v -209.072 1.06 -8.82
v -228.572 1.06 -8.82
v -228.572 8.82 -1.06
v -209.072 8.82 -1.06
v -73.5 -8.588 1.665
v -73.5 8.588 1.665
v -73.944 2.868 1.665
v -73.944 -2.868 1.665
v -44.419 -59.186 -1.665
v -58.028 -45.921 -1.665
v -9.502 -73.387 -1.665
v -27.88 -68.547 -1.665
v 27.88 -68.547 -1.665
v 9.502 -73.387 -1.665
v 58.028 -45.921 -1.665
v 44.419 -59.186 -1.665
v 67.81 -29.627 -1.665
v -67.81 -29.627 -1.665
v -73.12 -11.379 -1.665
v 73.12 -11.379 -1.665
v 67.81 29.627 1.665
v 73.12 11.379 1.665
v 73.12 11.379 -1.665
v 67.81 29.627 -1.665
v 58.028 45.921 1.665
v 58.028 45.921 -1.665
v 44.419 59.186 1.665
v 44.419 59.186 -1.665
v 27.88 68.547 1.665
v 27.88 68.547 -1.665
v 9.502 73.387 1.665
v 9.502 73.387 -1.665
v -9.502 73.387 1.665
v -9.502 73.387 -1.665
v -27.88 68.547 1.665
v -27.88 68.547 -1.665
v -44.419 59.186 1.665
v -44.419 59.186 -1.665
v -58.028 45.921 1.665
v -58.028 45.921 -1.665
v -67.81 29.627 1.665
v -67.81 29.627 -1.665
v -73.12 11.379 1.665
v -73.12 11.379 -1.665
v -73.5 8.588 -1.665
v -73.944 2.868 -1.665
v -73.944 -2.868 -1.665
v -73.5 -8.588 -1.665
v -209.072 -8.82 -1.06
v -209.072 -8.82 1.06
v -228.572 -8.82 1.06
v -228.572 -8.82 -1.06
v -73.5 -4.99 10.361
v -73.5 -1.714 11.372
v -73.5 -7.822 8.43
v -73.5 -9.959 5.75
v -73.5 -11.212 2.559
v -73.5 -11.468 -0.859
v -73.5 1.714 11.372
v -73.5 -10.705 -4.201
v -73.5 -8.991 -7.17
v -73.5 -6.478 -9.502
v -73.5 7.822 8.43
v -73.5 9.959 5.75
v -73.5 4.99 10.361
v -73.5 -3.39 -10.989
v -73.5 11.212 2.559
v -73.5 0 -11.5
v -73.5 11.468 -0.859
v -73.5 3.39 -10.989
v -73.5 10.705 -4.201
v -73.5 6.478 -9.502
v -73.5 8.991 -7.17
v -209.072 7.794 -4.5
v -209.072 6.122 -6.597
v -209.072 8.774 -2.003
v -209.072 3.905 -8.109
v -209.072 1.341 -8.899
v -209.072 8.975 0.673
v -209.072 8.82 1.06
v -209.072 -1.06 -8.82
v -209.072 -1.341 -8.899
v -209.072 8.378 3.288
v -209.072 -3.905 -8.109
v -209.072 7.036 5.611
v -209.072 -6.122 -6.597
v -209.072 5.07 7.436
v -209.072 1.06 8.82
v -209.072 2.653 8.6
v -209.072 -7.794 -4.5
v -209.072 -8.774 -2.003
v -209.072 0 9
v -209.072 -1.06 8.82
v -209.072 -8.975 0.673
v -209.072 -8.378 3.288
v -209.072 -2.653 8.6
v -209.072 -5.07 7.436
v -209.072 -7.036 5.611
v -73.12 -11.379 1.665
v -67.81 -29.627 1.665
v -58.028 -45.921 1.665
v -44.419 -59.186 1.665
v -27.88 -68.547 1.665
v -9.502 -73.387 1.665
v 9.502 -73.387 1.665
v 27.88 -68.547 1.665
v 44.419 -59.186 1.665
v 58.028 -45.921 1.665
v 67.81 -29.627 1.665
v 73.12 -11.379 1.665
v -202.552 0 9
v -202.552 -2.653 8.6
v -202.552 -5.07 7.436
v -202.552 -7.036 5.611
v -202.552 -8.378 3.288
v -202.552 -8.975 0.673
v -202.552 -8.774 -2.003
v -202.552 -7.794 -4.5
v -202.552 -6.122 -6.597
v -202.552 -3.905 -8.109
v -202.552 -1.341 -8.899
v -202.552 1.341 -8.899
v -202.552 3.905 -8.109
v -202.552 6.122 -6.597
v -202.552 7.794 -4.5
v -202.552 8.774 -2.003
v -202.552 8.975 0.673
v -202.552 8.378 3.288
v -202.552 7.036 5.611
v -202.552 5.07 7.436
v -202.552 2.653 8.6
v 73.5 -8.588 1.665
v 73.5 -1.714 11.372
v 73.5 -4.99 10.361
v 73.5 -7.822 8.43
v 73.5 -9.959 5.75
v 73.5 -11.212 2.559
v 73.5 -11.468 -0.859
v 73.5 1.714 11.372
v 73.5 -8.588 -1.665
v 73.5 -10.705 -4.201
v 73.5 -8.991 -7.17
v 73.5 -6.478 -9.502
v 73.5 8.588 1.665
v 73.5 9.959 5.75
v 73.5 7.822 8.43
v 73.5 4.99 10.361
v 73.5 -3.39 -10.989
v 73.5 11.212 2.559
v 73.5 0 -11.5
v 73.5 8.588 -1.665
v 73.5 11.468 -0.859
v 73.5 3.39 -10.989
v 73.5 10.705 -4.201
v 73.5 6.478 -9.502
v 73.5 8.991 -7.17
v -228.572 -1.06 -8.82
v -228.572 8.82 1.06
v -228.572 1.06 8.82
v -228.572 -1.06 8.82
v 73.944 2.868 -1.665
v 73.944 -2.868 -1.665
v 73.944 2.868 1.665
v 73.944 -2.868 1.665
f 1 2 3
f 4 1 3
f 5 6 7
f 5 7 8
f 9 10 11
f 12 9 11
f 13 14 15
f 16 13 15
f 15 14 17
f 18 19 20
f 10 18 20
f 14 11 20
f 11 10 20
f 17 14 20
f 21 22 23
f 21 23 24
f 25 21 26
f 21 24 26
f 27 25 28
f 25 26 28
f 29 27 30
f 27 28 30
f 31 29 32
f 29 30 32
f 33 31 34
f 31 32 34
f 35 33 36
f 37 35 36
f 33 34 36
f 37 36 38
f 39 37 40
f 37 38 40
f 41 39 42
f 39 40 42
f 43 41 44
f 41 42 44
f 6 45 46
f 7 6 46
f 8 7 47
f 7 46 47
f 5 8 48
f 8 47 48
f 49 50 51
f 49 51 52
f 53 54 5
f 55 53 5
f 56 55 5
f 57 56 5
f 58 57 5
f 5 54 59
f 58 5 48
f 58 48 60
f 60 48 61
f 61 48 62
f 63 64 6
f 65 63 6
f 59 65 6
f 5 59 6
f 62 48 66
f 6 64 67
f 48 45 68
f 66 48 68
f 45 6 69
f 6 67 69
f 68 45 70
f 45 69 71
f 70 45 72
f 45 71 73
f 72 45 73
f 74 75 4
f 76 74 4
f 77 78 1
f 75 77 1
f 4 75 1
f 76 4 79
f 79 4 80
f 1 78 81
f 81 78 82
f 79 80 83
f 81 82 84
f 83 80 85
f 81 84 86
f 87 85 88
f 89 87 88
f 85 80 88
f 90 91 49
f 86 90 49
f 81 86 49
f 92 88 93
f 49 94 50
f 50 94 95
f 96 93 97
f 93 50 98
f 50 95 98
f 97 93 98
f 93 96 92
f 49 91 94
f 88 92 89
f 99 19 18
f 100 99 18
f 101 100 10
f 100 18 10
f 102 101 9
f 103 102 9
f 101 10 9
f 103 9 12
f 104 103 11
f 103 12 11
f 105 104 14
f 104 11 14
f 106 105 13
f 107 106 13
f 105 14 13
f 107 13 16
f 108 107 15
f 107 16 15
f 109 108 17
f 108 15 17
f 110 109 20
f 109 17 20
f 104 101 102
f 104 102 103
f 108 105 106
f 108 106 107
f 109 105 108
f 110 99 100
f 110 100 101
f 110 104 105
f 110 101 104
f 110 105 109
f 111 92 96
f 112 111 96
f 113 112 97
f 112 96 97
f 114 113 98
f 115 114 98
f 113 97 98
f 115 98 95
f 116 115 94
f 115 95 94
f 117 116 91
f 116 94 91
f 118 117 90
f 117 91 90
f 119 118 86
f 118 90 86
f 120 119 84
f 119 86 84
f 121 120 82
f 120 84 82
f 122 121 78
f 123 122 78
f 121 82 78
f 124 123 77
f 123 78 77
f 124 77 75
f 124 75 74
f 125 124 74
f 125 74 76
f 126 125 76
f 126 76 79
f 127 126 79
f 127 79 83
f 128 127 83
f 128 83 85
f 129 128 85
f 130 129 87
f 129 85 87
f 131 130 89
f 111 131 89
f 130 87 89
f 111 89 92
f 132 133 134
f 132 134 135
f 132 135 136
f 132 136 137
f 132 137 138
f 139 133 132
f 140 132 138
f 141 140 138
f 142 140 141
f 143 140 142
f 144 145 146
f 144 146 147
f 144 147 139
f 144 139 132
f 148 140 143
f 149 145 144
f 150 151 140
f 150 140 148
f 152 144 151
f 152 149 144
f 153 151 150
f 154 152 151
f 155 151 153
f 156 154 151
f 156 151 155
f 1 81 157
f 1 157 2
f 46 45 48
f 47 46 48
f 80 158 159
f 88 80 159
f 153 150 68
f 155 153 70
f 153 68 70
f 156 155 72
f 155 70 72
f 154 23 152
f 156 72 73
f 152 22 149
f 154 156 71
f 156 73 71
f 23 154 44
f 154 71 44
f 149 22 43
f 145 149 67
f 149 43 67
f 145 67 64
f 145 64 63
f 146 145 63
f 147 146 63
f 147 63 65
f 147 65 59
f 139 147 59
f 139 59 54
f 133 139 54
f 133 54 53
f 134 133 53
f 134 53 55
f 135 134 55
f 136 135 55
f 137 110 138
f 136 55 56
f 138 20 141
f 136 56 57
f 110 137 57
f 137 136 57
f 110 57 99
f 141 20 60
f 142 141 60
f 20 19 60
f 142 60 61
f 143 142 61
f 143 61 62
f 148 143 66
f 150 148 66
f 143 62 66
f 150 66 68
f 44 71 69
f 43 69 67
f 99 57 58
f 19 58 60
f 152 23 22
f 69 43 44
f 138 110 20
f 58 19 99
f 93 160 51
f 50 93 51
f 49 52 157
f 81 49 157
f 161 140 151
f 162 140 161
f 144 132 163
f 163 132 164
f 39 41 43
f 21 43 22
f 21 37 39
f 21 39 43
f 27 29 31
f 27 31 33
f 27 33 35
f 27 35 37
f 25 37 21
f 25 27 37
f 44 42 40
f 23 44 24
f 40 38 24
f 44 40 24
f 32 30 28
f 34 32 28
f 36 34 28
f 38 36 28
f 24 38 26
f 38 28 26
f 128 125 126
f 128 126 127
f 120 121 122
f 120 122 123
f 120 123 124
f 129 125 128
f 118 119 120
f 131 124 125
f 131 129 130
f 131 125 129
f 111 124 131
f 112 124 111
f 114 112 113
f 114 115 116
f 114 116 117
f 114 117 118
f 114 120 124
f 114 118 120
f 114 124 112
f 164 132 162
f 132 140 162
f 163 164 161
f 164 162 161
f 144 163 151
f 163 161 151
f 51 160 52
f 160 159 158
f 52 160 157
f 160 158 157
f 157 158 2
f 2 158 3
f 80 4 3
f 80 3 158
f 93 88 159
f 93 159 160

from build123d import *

# Parameters (mm, degrees)
HOLT_START                                     = -1.665
SKETCH1_R                                      = 74
HOLT_DISC_148_MM_DIAMETER_AND_3_33_MM_DEPTH    = 3.33
VISIBLE_START                                  = -73.5
SKETCH2_R                                      = 11.5
VISIBLE_STEM_23_MM_DIAMETER_WITH_RUNNI_DEPTH   = 147
UPPER_START                                    = -209.0719
SKETCH3_R                                      = 9
UPPER_STEM_COLLAR_AT_VALVE_FLANGE_DEPTH        = 6.52
HOLT_START_2                                   = -228.5719
HOLT_14_MM_SQUARE_DRIVE_WITH_CORNER_FLAT_DEPTH = 19.5


with BuildPart() as part:
    # Sketch1 → HOLT disc - 148 mm diameter and 3.33 mm thick (new body)
    with BuildSketch(Plane.XY.offset(HOLT_START)):
        Circle(SKETCH1_R)
    extrude(amount=HOLT_DISC_148_MM_DIAMETER_AND_3_33_MM_DEPTH)

    # Sketch2 → Visible stem - 23 mm diameter with running clearance (add)
    with BuildSketch(Plane(origin=(0, 0, 0), x_dir=(0, 0, -1), z_dir=(1, 0, 0)).offset(VISIBLE_START)):
        Circle(SKETCH2_R)
    extrude(amount=VISIBLE_STEM_23_MM_DIAMETER_WITH_RUNNI_DEPTH)


with BuildPart() as body_2:
    # Sketch3 → Upper stem collar at valve flange (new body)
    with BuildSketch(Plane(origin=(0, 0, 0), x_dir=(0, 0, -1), z_dir=(1, 0, 0)).offset(UPPER_START)):
        with Locations(Location((0, 0, 0), (0, 0, 180))):
            Circle(SKETCH3_R)
    extrude(amount=UPPER_STEM_COLLAR_AT_VALVE_FLANGE_DEPTH)

    # Sketch4 → HOLT 14 mm square drive with corner flats (add)
    with BuildSketch(Plane(origin=(0, 0, 0), x_dir=(0, 0, -1), z_dir=(1, 0, 0)).offset(HOLT_START_2)):
        Polygon((-8.82, 1.06), (-8.82, -1.06), (-1.06, -8.82), (1.06, -8.82), (8.82, -1.06), (8.82, 1.06), (1.06, 8.82), (-1.06, 8.82), align=None)
    extrude(amount=HOLT_14_MM_SQUARE_DRIVE_WITH_CORNER_FLAT_DEPTH)


solid = Compound([part.part, body_2.part])
